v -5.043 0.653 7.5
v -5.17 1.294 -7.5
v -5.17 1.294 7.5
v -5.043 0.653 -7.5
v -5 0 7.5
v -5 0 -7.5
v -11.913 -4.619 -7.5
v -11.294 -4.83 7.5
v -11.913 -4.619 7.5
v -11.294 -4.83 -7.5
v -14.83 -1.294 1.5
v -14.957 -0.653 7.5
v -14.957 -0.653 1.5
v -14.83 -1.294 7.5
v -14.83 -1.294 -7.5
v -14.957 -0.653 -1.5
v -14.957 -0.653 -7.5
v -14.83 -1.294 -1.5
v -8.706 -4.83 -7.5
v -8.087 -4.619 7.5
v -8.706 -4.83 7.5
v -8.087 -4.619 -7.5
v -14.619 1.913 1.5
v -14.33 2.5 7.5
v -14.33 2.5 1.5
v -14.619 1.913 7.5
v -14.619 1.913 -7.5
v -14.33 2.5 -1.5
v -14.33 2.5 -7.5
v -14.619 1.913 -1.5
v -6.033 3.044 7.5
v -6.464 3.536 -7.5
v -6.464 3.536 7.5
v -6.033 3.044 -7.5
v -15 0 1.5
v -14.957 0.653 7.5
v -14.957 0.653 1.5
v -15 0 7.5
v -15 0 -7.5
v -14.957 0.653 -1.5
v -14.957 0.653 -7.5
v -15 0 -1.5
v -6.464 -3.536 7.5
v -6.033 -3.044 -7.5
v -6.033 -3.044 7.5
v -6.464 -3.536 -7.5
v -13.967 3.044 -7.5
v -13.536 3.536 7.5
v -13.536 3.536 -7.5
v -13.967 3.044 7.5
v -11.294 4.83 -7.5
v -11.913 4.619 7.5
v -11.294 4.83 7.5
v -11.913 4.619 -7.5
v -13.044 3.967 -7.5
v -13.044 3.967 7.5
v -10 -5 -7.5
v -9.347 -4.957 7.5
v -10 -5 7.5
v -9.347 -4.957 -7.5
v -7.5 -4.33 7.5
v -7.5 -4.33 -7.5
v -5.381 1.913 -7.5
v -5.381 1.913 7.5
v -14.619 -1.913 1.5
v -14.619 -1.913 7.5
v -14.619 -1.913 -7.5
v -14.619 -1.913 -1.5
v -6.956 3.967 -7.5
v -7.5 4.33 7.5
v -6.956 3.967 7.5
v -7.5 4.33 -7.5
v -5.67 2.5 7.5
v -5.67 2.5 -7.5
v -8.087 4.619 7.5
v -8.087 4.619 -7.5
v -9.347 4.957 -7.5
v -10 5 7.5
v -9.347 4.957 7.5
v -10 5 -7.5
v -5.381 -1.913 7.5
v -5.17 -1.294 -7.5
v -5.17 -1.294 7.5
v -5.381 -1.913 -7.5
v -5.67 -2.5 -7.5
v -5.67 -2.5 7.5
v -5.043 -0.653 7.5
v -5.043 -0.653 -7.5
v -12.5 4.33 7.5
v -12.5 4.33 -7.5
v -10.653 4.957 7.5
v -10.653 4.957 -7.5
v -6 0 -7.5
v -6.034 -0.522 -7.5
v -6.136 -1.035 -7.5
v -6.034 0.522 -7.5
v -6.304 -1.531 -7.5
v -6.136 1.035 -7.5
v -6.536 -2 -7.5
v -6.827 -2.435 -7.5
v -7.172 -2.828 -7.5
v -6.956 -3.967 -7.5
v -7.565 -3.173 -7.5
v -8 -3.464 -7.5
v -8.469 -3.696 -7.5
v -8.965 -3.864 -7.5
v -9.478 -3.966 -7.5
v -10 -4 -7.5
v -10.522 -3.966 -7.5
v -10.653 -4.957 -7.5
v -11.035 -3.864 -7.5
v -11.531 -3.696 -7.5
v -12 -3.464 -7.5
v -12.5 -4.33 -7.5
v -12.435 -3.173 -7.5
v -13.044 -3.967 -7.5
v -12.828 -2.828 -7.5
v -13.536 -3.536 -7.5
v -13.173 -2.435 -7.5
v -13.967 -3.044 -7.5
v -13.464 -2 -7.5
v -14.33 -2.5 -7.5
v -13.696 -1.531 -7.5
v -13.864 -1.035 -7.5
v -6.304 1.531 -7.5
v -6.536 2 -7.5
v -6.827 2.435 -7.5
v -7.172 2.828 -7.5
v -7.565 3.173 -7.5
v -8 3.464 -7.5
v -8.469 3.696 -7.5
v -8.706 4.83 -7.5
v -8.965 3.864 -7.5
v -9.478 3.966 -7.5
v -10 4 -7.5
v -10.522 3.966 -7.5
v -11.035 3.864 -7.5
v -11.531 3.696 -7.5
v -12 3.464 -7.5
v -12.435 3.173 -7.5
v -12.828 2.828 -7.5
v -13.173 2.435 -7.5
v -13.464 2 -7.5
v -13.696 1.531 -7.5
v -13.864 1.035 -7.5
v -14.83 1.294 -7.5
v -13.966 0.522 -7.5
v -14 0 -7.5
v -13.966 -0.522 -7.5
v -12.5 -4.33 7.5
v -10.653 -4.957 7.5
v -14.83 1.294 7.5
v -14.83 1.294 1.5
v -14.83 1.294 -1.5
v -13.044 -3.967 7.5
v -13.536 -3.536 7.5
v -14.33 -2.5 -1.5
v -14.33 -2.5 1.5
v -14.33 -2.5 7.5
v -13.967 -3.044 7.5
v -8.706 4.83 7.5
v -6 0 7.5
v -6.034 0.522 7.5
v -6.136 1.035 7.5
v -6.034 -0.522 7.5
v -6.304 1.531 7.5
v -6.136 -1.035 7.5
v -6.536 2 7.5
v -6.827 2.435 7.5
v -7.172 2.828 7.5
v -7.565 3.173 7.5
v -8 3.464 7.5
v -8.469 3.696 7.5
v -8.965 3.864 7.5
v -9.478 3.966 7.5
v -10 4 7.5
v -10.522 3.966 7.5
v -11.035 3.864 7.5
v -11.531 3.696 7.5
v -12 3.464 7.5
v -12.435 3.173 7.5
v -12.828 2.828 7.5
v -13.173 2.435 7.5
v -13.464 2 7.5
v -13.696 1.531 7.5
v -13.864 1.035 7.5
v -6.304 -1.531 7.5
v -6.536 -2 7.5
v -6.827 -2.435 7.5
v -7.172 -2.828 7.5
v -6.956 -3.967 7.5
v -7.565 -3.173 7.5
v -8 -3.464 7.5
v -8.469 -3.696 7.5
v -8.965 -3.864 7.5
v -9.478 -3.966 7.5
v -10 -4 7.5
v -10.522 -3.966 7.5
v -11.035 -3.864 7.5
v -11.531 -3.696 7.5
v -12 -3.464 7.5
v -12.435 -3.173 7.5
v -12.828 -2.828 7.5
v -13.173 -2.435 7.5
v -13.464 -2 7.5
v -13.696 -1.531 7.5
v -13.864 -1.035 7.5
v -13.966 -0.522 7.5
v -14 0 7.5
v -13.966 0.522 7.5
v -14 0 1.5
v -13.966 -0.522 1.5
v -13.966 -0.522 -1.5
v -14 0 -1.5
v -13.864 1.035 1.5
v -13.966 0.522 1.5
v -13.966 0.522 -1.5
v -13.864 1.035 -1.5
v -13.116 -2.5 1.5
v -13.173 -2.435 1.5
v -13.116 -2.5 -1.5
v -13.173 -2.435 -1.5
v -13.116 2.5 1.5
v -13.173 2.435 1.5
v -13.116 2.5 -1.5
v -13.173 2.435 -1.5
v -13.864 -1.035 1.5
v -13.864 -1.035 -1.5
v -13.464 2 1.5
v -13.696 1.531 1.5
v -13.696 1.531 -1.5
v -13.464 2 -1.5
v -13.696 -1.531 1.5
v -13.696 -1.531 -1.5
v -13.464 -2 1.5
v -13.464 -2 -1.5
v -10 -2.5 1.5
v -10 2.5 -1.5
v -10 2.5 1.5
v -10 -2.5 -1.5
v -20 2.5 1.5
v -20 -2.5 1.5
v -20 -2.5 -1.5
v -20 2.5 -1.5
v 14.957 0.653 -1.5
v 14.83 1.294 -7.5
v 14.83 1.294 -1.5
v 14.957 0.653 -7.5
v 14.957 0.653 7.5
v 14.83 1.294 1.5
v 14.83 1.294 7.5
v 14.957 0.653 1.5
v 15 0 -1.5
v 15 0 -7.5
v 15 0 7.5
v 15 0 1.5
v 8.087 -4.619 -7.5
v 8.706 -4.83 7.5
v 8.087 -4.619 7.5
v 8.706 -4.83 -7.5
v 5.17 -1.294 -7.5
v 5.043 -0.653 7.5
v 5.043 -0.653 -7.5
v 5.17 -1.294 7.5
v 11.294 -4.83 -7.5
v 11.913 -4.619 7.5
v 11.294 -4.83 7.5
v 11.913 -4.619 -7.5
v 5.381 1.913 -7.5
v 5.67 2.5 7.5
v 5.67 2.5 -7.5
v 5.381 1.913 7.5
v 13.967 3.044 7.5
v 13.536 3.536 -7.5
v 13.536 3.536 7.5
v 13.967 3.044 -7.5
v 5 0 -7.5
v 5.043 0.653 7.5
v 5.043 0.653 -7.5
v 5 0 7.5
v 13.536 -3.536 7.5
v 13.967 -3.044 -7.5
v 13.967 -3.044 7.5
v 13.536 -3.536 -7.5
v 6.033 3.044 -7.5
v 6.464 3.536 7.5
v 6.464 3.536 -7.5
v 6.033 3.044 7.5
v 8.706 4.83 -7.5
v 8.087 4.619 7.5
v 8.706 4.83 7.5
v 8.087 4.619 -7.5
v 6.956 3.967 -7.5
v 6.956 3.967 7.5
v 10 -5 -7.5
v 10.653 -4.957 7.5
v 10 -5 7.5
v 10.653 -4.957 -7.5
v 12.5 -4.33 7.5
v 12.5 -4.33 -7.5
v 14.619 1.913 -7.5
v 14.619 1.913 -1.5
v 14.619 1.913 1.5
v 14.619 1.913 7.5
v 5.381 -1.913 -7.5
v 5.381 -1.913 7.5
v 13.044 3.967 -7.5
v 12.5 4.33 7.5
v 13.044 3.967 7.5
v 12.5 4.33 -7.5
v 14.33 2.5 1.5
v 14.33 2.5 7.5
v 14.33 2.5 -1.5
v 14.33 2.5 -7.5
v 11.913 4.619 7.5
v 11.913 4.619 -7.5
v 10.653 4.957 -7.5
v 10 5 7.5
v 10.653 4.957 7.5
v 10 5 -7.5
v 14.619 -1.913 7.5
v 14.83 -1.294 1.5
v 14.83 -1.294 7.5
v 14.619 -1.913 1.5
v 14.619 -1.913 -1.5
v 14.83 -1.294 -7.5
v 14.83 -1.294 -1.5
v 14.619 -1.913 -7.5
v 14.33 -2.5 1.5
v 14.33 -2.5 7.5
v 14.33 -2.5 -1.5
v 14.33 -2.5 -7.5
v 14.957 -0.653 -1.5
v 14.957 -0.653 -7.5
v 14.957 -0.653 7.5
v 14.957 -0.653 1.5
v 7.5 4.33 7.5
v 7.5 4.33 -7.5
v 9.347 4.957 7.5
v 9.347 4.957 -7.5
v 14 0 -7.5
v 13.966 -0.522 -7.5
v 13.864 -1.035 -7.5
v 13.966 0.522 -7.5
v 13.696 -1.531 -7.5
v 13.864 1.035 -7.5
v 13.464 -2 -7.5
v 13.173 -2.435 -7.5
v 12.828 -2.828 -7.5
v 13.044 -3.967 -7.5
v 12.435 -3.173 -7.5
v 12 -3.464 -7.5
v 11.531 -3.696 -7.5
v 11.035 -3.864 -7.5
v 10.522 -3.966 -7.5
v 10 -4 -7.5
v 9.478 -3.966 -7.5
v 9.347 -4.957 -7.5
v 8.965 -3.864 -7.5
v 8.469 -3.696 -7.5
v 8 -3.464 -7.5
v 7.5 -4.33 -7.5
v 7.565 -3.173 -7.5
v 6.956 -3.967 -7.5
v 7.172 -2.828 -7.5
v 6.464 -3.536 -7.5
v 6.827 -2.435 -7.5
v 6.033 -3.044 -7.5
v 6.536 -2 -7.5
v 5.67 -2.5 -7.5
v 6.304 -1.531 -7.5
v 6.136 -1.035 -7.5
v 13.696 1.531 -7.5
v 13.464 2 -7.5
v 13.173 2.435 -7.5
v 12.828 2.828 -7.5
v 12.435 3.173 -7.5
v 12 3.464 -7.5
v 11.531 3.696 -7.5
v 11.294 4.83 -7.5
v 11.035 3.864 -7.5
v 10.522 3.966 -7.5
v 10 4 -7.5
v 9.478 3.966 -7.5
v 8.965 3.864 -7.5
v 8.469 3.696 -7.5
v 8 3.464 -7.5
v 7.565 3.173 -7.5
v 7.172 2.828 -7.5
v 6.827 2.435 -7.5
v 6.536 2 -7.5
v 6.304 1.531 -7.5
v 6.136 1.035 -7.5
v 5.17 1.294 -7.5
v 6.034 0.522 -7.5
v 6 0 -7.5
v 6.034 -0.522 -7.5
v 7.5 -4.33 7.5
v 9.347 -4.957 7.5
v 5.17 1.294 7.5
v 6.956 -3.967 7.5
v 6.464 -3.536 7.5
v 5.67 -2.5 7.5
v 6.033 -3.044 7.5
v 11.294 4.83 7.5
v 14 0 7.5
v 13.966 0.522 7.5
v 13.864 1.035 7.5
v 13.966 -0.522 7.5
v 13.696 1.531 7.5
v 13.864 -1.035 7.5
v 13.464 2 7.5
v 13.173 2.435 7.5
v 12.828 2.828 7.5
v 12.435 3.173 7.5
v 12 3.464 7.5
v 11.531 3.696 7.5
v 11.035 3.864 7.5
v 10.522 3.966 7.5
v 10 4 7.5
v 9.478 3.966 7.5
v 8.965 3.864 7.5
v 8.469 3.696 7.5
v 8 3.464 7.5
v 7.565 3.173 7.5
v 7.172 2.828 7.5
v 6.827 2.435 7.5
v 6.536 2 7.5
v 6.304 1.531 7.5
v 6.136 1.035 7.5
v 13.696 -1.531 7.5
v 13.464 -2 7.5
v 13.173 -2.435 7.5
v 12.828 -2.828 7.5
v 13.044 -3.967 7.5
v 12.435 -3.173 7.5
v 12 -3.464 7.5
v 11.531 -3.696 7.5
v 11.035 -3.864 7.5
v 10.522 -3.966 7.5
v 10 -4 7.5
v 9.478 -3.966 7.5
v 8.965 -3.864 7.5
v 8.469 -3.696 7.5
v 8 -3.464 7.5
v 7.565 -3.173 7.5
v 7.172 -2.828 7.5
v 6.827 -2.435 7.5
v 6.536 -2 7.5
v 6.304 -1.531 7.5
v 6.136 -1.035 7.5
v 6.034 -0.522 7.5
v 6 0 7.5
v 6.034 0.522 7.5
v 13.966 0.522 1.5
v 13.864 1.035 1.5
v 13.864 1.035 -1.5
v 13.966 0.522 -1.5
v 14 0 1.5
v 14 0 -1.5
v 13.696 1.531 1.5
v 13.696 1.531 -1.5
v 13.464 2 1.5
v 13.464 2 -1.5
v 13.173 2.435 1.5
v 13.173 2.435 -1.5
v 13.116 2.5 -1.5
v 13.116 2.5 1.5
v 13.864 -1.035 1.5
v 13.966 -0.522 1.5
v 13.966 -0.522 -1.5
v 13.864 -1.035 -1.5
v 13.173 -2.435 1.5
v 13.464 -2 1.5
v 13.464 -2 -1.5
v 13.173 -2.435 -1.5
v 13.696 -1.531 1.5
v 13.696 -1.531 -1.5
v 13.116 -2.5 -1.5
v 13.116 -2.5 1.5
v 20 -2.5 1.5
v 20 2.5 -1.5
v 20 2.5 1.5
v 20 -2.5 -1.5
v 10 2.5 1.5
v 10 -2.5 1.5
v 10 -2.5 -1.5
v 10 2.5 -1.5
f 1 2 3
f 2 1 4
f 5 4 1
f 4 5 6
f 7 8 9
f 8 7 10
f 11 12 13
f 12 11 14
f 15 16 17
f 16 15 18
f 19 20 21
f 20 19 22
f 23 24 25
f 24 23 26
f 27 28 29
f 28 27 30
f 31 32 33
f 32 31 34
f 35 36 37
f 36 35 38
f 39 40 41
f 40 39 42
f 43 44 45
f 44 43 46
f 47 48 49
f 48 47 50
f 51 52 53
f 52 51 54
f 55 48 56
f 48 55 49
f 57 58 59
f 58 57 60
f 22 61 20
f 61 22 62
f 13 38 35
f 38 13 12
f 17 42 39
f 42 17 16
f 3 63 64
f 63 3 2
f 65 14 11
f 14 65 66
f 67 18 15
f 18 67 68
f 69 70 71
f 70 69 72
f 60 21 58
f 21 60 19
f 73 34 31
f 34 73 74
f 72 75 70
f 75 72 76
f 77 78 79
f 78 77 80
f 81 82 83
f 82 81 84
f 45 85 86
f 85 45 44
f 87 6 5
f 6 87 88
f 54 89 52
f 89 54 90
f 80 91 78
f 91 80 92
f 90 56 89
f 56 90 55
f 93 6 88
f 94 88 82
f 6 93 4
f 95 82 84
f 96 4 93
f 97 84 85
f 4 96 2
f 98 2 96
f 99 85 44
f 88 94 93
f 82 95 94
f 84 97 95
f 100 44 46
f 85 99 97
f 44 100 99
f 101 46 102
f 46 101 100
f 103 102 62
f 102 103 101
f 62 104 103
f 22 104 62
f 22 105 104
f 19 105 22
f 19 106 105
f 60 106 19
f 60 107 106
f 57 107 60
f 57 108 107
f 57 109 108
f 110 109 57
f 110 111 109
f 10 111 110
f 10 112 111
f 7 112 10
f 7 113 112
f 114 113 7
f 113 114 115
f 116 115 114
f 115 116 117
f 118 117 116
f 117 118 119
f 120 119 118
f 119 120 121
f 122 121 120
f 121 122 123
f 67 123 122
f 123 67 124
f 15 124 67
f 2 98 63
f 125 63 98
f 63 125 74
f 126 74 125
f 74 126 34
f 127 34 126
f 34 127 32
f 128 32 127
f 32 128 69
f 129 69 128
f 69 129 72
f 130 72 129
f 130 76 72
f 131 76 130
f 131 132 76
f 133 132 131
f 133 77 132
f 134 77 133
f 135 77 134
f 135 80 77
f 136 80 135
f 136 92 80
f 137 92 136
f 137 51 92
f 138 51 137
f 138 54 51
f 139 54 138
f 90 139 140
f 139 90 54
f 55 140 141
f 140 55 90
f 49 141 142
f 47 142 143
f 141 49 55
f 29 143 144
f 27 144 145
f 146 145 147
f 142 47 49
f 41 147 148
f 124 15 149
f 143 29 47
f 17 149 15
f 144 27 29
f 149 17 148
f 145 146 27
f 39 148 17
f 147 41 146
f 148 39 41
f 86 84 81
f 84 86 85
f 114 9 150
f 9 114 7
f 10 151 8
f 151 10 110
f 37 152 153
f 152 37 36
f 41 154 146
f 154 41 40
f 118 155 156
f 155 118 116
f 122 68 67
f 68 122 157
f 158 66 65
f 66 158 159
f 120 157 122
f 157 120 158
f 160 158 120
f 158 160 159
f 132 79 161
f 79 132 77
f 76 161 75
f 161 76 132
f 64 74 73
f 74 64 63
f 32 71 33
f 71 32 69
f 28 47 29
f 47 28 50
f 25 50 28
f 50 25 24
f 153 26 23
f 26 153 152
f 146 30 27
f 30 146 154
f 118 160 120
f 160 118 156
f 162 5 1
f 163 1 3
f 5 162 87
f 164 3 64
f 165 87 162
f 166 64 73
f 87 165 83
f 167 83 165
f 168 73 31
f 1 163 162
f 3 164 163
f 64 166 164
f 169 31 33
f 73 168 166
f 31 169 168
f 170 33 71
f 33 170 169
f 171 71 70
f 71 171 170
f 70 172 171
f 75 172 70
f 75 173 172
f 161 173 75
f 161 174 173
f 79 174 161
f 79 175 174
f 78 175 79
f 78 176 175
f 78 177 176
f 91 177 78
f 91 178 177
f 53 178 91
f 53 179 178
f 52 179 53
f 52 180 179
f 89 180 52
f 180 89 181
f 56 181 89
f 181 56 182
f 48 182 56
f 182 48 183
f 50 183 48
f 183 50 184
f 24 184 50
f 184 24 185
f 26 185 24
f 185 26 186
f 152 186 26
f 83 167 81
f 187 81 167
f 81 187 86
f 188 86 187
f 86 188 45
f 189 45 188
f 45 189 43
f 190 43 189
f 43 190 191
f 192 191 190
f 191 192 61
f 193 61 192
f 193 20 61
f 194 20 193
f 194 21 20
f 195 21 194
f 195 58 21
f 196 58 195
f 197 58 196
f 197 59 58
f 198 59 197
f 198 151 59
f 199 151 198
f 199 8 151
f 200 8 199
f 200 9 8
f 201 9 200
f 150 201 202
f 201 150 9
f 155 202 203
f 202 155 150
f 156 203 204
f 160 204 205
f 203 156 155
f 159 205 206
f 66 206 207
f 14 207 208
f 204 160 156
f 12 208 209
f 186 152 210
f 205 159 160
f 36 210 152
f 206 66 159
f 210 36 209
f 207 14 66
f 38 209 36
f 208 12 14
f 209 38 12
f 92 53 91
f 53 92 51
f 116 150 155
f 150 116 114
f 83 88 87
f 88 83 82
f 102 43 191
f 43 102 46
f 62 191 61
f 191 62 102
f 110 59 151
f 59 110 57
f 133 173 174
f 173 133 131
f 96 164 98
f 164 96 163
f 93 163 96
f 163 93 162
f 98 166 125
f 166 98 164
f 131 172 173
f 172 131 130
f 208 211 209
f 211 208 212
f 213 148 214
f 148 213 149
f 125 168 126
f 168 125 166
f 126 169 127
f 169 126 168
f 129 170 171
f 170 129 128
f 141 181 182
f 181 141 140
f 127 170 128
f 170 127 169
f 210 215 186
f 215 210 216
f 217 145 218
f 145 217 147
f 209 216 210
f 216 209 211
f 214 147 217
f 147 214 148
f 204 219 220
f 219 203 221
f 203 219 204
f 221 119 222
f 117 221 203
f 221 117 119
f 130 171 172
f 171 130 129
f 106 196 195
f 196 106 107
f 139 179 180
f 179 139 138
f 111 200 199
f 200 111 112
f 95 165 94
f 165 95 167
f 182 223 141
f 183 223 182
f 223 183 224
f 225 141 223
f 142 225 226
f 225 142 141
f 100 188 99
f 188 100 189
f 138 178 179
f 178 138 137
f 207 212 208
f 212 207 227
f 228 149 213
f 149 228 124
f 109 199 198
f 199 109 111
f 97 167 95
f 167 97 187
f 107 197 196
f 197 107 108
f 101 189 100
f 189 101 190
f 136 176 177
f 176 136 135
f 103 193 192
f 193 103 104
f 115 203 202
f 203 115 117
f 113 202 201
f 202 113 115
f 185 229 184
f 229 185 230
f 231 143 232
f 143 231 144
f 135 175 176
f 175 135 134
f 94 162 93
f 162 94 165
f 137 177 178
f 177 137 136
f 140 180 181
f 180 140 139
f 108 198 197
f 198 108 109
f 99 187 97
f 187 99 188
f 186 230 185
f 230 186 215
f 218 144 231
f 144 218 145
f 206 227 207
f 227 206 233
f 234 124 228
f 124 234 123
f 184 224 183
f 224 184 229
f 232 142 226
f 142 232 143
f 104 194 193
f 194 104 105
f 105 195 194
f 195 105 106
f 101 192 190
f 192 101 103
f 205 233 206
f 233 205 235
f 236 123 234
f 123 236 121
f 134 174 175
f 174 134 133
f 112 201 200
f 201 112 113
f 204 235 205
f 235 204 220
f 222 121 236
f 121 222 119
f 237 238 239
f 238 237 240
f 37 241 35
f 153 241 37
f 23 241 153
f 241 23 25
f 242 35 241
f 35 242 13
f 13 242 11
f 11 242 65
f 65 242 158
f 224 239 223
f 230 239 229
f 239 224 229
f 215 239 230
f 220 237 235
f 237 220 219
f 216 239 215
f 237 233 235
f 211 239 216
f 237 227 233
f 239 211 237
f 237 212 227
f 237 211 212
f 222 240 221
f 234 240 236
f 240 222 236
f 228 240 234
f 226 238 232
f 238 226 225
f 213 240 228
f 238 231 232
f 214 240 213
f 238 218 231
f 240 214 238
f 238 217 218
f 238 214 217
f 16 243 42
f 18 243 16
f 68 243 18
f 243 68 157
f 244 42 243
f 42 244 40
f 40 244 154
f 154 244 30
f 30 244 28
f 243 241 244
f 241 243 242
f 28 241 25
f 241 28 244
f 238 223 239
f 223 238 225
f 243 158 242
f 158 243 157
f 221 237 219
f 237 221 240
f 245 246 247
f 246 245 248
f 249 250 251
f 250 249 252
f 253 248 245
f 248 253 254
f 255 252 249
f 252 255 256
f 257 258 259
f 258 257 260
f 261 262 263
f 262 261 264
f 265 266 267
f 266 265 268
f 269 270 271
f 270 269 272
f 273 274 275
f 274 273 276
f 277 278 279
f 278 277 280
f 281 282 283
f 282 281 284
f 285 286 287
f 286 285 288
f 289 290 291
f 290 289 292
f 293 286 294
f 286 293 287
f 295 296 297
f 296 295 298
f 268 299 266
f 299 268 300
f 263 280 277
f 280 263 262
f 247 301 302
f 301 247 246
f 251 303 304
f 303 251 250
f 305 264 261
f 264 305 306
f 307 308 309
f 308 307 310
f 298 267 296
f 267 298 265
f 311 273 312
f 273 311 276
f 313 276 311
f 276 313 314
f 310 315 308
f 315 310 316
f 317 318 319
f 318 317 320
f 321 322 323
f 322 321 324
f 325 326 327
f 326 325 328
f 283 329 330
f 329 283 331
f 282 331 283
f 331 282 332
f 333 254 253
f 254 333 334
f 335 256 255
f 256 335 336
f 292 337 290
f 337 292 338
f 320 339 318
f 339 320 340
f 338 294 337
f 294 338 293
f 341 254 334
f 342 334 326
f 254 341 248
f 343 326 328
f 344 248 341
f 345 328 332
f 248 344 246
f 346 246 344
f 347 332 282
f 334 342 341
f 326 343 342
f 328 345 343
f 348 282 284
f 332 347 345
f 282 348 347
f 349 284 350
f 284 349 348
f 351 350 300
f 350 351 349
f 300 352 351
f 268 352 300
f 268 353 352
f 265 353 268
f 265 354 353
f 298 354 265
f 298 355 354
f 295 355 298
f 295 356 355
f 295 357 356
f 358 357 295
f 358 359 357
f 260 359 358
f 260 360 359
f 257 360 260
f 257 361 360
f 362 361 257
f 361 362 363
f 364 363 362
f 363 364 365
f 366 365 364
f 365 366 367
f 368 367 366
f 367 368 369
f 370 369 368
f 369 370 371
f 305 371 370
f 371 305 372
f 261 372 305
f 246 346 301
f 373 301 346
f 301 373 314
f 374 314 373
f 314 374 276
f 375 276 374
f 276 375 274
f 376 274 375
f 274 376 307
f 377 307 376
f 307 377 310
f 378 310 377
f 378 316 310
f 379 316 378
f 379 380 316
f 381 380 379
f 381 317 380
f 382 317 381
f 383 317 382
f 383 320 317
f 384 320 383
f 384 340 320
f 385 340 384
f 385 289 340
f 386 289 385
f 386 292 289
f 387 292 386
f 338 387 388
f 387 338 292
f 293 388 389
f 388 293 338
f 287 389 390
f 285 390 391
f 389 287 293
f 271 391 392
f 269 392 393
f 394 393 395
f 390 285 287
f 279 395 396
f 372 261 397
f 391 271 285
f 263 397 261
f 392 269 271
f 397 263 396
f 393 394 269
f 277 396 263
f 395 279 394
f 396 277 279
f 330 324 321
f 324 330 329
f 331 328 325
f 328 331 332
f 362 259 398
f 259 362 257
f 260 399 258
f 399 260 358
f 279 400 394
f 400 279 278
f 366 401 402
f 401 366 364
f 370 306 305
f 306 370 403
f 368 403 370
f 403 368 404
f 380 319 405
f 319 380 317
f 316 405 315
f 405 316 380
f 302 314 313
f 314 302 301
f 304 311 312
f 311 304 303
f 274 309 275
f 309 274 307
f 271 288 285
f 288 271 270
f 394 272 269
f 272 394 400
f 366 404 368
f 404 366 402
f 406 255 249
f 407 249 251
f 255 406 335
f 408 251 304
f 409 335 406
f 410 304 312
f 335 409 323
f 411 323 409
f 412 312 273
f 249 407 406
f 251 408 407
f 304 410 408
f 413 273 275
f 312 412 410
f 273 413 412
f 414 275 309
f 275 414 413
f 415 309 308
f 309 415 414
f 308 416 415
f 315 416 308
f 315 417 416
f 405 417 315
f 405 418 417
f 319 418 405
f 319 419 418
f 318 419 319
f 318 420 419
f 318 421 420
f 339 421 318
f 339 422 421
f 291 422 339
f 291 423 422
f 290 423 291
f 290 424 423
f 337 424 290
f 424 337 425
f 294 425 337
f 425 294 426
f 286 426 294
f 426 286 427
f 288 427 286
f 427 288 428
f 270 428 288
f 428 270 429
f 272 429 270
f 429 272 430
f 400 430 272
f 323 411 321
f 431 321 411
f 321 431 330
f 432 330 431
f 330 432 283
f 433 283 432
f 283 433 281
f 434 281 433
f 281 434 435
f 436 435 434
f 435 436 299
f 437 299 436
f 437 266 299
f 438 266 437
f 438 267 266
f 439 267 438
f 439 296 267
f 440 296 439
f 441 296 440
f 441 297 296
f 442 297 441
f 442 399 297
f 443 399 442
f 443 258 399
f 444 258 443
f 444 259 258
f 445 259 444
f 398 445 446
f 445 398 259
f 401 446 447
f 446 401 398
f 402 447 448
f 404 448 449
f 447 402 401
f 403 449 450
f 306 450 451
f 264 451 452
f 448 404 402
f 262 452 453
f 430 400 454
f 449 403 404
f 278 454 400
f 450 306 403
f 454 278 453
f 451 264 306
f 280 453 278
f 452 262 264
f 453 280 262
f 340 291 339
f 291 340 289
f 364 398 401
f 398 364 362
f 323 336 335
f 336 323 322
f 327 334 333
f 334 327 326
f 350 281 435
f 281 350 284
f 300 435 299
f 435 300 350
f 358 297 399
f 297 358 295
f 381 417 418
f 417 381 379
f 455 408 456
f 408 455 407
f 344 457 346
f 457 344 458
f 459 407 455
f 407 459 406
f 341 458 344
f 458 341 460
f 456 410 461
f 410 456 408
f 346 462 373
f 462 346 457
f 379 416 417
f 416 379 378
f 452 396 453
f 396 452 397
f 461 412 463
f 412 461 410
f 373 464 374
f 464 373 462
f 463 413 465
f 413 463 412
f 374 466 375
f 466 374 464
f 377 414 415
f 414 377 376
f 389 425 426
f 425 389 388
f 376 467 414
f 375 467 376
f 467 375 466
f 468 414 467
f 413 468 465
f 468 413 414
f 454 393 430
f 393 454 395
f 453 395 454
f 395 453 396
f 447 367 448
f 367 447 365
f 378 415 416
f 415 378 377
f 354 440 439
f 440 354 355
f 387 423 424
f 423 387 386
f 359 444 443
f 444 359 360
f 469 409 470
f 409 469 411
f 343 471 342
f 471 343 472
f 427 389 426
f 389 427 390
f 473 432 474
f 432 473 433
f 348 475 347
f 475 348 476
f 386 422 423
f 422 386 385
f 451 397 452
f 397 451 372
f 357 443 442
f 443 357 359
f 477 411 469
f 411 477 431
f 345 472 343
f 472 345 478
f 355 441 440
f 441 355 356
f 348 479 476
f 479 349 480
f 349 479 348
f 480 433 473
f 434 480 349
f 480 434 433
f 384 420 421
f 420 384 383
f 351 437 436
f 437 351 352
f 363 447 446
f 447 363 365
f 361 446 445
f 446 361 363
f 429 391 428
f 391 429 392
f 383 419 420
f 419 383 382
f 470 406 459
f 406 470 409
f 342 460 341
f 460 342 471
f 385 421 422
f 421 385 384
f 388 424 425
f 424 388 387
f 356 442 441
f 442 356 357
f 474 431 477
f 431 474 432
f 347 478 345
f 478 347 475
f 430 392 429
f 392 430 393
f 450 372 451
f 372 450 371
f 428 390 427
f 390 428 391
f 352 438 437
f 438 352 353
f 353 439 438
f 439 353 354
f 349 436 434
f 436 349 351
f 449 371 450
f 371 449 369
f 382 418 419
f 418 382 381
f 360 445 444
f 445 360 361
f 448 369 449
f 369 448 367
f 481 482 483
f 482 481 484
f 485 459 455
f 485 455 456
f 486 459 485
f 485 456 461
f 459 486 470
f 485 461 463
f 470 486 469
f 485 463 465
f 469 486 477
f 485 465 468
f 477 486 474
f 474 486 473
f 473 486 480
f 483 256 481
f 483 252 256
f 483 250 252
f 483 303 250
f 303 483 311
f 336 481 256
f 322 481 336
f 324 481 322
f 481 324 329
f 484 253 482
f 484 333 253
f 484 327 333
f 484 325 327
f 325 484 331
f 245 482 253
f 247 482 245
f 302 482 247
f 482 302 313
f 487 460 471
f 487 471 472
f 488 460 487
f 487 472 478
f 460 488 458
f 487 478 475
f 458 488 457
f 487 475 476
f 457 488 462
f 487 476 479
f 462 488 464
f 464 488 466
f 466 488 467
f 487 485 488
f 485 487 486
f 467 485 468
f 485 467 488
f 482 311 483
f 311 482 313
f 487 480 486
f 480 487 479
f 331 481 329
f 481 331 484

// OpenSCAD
$fn = 48;

union() {
	union() {
		translate(v = [-15, 0, 0]) {
			cube(center = true, size = [10, 5, 3]);
		}
		translate(v = [-10, 0, 0]) {
			difference() {
				cylinder(h = 15, r = 5, center = true);
				cylinder(h = 16, r = 4, center = true);
			}
		}
	}
	union() {
		translate(v = [15, 0, 0]) {
			cube(center = true, size = [10, 5, 3]);
		}
		translate(v = [10, 0, 0]) {
			difference() {
				cylinder(h = 15, r = 5, center = true);
				cylinder(h = 16, r = 4, center = true);
			}
		}
	}
}
